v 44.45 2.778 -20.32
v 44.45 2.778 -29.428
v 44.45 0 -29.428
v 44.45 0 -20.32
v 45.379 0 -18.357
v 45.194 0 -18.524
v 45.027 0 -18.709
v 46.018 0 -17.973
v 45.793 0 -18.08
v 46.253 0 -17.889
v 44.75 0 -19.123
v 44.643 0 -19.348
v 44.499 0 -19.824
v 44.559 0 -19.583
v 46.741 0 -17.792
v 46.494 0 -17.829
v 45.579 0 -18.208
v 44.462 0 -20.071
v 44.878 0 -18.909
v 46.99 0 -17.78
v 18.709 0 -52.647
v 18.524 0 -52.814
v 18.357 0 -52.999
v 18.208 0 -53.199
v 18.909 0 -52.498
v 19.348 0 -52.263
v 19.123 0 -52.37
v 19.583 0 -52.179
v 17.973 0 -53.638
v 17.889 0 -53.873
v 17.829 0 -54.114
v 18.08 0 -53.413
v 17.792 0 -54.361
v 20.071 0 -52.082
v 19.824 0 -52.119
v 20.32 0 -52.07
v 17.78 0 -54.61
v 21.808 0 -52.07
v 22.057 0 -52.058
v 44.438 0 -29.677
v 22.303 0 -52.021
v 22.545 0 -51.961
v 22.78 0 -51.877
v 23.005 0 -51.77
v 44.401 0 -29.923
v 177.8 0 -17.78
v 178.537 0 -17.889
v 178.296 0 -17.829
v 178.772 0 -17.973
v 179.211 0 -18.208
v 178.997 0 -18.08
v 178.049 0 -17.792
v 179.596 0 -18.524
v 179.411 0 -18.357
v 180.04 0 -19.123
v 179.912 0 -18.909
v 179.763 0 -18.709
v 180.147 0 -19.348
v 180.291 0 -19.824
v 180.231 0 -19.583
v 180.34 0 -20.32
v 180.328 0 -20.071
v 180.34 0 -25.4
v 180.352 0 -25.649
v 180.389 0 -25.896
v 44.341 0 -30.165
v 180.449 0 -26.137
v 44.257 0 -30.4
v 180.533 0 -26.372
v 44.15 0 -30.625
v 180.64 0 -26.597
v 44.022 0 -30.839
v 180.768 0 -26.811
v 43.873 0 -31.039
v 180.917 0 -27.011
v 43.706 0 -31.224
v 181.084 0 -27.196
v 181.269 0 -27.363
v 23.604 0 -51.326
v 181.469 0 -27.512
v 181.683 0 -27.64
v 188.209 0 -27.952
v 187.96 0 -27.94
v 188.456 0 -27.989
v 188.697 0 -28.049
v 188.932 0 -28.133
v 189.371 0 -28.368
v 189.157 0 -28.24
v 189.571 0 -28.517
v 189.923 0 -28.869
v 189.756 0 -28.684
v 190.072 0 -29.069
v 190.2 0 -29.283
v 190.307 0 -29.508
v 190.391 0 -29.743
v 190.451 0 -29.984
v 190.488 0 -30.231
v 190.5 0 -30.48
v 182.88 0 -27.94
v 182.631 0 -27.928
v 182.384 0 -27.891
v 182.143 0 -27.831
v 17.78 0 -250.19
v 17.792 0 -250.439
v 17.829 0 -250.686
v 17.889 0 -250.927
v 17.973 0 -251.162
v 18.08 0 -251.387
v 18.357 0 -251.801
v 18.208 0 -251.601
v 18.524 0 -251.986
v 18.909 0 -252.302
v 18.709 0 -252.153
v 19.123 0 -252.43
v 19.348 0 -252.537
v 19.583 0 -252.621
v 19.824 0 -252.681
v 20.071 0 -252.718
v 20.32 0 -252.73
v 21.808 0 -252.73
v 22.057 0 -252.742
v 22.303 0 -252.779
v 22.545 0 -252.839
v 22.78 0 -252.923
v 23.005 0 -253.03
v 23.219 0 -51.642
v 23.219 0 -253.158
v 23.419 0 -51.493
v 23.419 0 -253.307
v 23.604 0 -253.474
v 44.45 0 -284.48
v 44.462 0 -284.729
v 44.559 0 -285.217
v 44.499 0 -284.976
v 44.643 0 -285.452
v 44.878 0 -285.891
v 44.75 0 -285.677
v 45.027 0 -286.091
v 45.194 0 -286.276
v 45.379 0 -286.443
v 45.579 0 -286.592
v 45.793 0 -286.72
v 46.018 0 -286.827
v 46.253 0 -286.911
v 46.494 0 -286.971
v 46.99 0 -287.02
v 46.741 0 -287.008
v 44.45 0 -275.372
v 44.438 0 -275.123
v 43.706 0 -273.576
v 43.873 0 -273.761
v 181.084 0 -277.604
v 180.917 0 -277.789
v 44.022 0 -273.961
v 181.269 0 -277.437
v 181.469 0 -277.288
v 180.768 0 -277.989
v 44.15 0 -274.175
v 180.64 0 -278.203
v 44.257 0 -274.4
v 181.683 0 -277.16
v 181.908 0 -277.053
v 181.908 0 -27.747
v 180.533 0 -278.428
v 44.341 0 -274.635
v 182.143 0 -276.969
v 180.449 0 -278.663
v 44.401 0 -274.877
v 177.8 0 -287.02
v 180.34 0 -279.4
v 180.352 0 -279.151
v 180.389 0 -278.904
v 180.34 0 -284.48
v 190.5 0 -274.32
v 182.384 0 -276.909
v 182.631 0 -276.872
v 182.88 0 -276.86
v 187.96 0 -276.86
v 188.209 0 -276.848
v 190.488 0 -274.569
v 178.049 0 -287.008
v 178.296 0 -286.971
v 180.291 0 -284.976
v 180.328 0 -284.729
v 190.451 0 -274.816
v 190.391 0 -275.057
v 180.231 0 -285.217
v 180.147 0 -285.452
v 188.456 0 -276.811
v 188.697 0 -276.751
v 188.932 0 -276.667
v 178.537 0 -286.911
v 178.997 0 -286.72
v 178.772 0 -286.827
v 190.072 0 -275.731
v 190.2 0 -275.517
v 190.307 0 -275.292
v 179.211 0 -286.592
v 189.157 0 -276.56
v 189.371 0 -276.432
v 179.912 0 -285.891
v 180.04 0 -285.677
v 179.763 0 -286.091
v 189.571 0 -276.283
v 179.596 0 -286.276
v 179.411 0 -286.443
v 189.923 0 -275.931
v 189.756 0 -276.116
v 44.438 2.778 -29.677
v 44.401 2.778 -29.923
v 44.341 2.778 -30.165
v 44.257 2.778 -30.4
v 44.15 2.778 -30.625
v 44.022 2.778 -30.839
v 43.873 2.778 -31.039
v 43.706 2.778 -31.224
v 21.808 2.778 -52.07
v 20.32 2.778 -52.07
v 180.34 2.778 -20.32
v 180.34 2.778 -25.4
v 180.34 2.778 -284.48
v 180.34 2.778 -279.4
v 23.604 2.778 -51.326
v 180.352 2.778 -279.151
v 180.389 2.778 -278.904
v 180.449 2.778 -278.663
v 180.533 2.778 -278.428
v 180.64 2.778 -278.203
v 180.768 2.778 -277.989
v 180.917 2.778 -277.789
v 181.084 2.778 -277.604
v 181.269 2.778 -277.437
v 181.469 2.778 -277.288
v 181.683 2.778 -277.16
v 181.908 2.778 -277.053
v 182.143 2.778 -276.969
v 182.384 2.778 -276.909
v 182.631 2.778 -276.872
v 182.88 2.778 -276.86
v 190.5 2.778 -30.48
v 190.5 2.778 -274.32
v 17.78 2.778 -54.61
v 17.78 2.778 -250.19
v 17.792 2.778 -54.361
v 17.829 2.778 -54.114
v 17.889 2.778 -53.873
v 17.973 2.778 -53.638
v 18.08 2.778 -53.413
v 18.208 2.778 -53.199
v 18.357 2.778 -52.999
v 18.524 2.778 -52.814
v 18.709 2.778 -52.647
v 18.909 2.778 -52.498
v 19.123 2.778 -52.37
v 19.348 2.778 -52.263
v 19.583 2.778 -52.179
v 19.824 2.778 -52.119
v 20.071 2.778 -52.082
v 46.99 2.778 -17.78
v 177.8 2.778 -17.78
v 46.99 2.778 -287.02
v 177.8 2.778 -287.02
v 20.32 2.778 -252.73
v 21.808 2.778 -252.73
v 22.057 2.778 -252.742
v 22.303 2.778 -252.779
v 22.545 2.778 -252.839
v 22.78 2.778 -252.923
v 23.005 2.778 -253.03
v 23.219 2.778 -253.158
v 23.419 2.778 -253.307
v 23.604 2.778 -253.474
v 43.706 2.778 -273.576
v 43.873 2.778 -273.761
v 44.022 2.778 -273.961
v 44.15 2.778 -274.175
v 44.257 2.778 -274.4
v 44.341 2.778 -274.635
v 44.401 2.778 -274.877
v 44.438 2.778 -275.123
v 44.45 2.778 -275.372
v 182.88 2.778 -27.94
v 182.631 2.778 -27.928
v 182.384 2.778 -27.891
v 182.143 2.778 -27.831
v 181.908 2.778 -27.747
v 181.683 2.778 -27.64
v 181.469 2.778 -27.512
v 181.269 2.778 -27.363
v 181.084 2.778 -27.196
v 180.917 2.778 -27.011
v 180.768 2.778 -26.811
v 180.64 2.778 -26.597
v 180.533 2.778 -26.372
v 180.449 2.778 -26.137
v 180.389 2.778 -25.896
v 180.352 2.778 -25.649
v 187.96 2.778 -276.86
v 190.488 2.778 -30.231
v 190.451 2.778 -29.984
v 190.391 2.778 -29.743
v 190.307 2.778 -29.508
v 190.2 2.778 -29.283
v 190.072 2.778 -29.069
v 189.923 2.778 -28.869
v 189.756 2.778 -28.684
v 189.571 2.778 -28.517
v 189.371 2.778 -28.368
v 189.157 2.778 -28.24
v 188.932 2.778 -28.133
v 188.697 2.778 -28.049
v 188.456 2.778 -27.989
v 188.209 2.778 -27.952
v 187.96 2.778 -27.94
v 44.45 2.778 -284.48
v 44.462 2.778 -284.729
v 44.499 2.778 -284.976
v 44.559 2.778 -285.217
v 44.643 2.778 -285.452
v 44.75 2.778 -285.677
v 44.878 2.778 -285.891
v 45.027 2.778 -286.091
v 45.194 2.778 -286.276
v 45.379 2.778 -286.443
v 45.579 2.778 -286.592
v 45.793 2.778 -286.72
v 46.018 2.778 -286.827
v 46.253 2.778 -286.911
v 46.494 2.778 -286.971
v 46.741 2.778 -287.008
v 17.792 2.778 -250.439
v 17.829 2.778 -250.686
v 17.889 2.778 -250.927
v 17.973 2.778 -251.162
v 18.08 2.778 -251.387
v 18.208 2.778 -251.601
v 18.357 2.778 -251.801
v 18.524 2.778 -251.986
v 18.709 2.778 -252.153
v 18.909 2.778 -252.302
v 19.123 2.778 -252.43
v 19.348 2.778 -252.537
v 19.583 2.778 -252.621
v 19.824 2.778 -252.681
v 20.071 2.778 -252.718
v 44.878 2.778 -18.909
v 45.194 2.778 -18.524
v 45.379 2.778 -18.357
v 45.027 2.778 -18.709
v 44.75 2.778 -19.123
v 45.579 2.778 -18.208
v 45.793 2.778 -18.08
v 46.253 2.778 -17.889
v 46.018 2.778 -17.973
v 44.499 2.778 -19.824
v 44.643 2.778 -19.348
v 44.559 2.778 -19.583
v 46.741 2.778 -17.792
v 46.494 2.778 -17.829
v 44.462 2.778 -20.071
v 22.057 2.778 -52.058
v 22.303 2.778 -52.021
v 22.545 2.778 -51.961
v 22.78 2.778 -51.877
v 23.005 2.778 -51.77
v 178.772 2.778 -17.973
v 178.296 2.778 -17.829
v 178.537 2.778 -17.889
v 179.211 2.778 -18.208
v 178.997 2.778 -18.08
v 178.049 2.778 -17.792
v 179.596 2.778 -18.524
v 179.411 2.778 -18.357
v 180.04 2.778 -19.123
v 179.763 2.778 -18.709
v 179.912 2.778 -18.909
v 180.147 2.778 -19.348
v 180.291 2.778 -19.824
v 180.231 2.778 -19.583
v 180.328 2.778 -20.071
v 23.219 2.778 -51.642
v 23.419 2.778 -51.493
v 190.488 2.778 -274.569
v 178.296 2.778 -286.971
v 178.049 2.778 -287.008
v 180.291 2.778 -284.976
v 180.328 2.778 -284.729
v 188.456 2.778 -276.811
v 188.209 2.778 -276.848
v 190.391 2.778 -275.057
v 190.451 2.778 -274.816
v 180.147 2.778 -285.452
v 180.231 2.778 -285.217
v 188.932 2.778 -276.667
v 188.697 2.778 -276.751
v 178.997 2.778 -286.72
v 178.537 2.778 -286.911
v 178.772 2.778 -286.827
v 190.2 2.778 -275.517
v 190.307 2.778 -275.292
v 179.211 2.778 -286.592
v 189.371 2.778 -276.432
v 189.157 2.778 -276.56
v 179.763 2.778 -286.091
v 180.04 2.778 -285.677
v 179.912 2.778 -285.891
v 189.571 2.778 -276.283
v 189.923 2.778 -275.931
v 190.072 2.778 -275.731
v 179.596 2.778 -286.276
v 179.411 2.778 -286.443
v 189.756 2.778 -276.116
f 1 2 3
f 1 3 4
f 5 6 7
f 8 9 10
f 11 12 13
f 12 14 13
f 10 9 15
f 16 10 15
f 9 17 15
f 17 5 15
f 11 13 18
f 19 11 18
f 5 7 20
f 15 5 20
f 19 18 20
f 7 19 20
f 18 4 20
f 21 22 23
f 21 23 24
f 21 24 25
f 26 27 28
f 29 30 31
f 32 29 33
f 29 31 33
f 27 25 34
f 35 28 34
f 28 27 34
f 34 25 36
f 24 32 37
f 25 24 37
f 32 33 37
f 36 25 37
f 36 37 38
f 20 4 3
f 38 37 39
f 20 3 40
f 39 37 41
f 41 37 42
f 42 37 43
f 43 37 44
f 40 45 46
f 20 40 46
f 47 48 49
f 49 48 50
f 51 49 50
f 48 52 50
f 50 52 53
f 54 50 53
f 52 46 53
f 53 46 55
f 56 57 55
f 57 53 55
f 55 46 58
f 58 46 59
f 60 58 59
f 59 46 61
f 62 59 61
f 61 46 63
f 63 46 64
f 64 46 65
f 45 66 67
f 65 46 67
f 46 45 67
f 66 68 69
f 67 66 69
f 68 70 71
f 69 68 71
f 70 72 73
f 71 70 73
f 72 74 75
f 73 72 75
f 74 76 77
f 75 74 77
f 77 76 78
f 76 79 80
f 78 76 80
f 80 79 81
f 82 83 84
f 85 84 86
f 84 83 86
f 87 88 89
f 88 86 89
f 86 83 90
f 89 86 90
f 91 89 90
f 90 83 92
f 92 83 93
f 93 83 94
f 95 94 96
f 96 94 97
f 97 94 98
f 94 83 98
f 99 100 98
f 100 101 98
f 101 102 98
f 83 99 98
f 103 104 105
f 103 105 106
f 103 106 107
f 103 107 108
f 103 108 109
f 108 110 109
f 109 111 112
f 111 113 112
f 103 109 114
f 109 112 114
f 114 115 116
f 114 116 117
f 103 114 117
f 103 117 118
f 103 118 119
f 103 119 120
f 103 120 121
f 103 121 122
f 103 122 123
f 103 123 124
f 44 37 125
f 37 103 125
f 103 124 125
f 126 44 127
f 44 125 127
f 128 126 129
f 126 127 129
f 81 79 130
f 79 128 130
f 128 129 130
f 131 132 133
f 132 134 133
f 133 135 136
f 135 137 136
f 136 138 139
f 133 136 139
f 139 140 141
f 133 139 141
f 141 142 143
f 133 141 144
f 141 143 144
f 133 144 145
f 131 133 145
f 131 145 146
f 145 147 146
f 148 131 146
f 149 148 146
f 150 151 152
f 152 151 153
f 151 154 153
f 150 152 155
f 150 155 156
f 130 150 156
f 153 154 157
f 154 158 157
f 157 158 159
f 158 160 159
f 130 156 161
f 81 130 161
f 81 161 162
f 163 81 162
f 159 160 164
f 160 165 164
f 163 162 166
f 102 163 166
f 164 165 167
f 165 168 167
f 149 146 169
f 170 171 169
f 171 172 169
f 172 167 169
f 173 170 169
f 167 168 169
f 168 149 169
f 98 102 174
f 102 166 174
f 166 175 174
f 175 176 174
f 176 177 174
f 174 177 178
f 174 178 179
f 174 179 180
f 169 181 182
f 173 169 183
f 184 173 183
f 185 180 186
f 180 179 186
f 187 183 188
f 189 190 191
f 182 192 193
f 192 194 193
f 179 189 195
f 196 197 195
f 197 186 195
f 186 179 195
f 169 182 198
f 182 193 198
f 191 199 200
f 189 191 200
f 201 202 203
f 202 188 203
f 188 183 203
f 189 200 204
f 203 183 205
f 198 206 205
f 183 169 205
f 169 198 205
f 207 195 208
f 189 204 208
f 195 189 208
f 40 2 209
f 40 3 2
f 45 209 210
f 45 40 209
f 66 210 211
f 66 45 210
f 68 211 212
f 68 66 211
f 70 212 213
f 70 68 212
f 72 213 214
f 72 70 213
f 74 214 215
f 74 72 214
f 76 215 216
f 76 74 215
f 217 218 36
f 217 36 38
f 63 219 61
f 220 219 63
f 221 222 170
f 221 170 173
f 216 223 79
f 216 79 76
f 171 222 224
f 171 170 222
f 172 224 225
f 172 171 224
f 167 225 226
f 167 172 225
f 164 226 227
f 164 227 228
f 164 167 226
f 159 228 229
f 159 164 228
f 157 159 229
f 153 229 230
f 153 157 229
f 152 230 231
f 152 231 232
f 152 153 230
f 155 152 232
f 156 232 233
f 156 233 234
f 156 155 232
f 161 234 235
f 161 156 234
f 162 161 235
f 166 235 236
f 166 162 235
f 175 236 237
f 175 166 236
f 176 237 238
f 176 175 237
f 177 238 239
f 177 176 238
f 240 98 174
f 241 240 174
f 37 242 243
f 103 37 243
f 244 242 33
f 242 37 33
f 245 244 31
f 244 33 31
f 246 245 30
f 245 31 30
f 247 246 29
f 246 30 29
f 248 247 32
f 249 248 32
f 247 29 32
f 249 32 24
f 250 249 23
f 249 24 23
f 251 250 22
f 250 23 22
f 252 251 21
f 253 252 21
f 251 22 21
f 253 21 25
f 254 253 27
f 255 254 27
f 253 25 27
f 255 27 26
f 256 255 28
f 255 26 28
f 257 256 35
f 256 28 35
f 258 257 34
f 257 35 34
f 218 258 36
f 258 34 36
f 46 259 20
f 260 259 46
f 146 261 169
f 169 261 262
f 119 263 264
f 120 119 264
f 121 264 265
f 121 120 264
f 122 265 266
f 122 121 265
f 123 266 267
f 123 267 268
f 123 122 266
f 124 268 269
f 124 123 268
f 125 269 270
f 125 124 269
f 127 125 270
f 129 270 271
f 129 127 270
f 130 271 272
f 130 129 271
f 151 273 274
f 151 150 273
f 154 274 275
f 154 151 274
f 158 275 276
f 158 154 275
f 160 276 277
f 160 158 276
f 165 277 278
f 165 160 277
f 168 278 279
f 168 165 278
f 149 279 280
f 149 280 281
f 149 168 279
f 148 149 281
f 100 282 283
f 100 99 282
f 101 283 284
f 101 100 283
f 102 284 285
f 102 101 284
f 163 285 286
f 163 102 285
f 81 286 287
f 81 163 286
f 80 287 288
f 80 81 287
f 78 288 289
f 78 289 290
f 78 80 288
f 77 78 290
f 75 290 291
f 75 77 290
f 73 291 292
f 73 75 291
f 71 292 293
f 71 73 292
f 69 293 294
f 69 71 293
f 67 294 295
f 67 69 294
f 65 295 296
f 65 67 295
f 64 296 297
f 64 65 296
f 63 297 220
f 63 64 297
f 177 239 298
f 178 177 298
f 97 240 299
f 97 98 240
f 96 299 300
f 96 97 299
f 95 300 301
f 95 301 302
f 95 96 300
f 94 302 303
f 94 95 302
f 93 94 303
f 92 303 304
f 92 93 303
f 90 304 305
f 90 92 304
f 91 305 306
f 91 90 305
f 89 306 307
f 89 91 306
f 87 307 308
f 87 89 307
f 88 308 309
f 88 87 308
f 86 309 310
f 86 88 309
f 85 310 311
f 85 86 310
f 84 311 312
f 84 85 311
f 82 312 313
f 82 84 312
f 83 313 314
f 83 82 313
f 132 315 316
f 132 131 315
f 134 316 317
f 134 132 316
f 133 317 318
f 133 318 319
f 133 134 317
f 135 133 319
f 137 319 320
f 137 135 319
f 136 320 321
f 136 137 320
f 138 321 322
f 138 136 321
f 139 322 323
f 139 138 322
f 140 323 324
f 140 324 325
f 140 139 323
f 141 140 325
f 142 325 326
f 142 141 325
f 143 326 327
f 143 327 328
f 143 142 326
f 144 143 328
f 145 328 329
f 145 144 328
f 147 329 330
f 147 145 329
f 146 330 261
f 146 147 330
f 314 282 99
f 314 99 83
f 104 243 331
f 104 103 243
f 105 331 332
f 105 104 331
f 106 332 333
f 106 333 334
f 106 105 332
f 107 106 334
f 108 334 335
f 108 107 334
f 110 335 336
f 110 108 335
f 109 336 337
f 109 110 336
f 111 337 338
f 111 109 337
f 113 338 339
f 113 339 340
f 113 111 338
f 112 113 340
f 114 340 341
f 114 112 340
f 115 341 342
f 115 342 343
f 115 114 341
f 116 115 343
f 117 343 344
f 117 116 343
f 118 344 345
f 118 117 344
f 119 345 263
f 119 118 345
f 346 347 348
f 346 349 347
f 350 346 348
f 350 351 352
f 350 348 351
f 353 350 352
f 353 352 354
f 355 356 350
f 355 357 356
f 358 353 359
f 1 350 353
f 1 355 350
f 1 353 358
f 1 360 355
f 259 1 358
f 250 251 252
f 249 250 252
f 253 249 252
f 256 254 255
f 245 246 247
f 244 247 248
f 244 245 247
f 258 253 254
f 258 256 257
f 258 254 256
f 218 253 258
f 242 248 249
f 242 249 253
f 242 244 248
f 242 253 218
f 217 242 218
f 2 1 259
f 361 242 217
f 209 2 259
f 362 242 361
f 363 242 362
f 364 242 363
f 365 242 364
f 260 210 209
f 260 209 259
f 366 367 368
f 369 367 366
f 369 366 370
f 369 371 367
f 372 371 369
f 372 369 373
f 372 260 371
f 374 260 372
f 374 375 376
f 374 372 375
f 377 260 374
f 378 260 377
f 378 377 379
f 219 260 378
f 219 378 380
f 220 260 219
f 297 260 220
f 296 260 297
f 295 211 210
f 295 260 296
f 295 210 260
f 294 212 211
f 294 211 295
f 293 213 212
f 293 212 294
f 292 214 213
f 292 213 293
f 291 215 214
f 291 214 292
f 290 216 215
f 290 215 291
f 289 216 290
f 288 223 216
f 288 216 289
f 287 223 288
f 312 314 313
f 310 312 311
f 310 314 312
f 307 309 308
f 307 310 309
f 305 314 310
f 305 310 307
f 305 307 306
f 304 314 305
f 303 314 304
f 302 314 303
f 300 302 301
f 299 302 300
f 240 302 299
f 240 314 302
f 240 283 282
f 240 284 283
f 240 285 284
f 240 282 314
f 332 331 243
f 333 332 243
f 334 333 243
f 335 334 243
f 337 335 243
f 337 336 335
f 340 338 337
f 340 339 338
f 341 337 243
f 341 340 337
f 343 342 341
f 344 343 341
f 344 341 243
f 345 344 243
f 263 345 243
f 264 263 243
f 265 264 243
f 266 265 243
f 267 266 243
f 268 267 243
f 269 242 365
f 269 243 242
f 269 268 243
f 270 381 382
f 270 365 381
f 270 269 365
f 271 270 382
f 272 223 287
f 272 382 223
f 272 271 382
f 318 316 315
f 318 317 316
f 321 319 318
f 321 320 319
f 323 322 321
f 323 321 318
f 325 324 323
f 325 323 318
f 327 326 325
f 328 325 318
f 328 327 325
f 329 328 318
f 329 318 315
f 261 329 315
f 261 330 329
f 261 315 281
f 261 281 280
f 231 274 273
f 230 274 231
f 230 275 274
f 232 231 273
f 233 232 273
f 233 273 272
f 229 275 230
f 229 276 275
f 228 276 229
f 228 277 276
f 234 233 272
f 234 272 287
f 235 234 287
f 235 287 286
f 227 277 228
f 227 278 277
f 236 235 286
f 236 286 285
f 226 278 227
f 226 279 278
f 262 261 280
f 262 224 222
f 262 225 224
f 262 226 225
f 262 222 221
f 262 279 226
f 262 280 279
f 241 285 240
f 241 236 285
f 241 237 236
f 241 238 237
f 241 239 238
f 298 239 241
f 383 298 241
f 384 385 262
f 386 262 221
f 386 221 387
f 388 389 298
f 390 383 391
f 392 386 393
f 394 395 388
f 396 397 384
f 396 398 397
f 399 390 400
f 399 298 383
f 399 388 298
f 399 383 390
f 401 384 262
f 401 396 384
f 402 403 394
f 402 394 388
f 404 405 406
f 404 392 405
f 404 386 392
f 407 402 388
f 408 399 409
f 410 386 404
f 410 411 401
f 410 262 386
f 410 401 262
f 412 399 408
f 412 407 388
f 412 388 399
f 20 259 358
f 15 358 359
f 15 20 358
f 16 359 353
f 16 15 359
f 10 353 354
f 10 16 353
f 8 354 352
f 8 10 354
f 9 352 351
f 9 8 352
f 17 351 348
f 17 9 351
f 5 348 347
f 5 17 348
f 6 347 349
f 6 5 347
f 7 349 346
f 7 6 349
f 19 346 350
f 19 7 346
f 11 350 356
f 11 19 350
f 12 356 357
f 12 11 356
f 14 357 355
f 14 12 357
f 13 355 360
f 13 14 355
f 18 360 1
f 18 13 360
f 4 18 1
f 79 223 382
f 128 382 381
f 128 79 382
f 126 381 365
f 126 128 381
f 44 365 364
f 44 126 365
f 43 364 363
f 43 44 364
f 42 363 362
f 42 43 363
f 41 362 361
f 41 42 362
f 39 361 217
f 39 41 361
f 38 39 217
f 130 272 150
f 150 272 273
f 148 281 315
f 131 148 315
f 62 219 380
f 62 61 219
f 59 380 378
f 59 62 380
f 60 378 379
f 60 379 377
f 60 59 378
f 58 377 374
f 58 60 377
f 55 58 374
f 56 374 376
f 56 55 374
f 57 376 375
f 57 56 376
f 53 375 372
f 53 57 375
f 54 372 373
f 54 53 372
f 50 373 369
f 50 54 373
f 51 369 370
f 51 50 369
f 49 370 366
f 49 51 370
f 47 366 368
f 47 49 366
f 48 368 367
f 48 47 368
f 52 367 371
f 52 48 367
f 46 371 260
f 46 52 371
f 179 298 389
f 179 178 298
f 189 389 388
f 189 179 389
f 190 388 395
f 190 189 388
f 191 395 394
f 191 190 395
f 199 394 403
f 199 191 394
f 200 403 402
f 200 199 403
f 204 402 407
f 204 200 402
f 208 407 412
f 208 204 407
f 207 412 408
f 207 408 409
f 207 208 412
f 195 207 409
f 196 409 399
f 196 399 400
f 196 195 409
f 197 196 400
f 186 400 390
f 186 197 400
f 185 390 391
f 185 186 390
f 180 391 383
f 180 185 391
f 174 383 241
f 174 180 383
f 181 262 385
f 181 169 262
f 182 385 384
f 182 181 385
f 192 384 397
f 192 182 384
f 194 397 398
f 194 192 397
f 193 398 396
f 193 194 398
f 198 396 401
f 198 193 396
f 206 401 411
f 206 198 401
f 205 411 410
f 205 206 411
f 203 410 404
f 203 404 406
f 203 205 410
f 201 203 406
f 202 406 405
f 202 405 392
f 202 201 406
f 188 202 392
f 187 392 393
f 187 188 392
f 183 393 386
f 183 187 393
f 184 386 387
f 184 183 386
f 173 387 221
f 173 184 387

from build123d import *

# Parameters (mm, degrees)
SKETCH1_W           = 190.5
SKETCH1_H           = 304.8
BOSS_EXTRUDE1_DEPTH = 2.778125
SKETCH2_W           = 190.5
SKETCH2_H           = 17.78
CUT_EXTRUDE1_DEPTH  = 3.778125
SKETCH3_W           = 17.78
SKETCH3_H           = 269.24
CUT_EXTRUDE2_DEPTH  = 3.778125
CUT_EXTRUDE3_DEPTH  = 3.778125
SKETCH5_W           = 10.16
SKETCH5_H           = 10.16
CUT_EXTRUDE4_DEPTH  = 3.778125
FILLET1_R           = 2.54


with BuildPart() as part:
    # Sketch1 → Boss-Extrude1 (new body)
    with BuildSketch(Plane(origin=(0, 0, 0), x_dir=(1, 0, 0), z_dir=(0, 1, 0))):
        with Locations((95.25, 152.4)):
            Rectangle(SKETCH1_W, SKETCH1_H)
    extrude(amount=BOSS_EXTRUDE1_DEPTH)

    # Sketch2 → Cut-Extrude1 (cut, through all)
    with BuildSketch(Plane(origin=(0, 2.778125, 0), x_dir=(1, 0, 0), z_dir=(0, 1, 0))):
        with Locations((95.25, 8.89)):
            Rectangle(SKETCH2_W, SKETCH2_H)
        with Locations((95.25, 295.91)):
            Rectangle(SKETCH2_W, SKETCH2_H)
    extrude(amount=-CUT_EXTRUDE1_DEPTH, mode=Mode.SUBTRACT)

    # Sketch3 → Cut-Extrude2 (cut, through all)
    with BuildSketch(Plane(origin=(0, 2.778125, 0), x_dir=(1, 0, 0), z_dir=(0, 1, 0))):
        with Locations((8.89, 152.4)):
            Rectangle(SKETCH3_W, SKETCH3_H)
    extrude(amount=-CUT_EXTRUDE2_DEPTH, mode=Mode.SUBTRACT)

    # Sketch4 → Cut-Extrude3 (cut, through all)
    with BuildSketch(Plane(origin=(0, 2.778125, 0), x_dir=(1, 0, 0), z_dir=(0, 1, 0))):
        Polygon((22.86, 252.73), (44.45, 274.32), (44.45, 287.02), (17.78, 287.02), (17.78, 252.73), align=None)
        Polygon((22.86, 52.07), (44.45, 30.48), (44.45, 17.78), (17.78, 17.78), (17.78, 52.07), align=None)
    extrude(amount=-CUT_EXTRUDE3_DEPTH, mode=Mode.SUBTRACT)

    # Sketch5 → Cut-Extrude4 (cut, through all)
    with BuildSketch(Plane(origin=(0, 2.778125, 0), x_dir=(1, 0, 0), z_dir=(0, 1, 0))):
        with Locations((185.42, 281.94)):
            Rectangle(SKETCH5_W, SKETCH5_H)
        with Locations((185.42, 22.86)):
            Rectangle(SKETCH5_W, SKETCH5_H)
    extrude(amount=-CUT_EXTRUDE4_DEPTH, mode=Mode.SUBTRACT)

    # Fillet1
    fillet1_edges = [part.edges().sort_by_distance(p)[0] for p in [
        (190.5, 1.3890625, -27.94),
        (180.34, 1.3890625, -17.78),
        (180.34, 1.3890625, -27.94),
        (44.45, 1.3890625, -287.02),
        (44.45, 1.3890625, -274.32),
        (22.86, 1.3890625, -252.73),
        (17.78, 1.3890625, -252.73),
        (17.78, 1.3890625, -52.07),
        (22.86, 1.3890625, -52.07),
        (44.45, 1.3890625, -30.48),
        (44.45, 1.3890625, -17.78),
        (190.5, 1.3890625, -276.86),
        (180.34, 1.3890625, -276.86),
        (180.34, 1.3890625, -287.02),
    ]]
    fillet(fillet1_edges, radius=FILLET1_R)


solid = part.part
